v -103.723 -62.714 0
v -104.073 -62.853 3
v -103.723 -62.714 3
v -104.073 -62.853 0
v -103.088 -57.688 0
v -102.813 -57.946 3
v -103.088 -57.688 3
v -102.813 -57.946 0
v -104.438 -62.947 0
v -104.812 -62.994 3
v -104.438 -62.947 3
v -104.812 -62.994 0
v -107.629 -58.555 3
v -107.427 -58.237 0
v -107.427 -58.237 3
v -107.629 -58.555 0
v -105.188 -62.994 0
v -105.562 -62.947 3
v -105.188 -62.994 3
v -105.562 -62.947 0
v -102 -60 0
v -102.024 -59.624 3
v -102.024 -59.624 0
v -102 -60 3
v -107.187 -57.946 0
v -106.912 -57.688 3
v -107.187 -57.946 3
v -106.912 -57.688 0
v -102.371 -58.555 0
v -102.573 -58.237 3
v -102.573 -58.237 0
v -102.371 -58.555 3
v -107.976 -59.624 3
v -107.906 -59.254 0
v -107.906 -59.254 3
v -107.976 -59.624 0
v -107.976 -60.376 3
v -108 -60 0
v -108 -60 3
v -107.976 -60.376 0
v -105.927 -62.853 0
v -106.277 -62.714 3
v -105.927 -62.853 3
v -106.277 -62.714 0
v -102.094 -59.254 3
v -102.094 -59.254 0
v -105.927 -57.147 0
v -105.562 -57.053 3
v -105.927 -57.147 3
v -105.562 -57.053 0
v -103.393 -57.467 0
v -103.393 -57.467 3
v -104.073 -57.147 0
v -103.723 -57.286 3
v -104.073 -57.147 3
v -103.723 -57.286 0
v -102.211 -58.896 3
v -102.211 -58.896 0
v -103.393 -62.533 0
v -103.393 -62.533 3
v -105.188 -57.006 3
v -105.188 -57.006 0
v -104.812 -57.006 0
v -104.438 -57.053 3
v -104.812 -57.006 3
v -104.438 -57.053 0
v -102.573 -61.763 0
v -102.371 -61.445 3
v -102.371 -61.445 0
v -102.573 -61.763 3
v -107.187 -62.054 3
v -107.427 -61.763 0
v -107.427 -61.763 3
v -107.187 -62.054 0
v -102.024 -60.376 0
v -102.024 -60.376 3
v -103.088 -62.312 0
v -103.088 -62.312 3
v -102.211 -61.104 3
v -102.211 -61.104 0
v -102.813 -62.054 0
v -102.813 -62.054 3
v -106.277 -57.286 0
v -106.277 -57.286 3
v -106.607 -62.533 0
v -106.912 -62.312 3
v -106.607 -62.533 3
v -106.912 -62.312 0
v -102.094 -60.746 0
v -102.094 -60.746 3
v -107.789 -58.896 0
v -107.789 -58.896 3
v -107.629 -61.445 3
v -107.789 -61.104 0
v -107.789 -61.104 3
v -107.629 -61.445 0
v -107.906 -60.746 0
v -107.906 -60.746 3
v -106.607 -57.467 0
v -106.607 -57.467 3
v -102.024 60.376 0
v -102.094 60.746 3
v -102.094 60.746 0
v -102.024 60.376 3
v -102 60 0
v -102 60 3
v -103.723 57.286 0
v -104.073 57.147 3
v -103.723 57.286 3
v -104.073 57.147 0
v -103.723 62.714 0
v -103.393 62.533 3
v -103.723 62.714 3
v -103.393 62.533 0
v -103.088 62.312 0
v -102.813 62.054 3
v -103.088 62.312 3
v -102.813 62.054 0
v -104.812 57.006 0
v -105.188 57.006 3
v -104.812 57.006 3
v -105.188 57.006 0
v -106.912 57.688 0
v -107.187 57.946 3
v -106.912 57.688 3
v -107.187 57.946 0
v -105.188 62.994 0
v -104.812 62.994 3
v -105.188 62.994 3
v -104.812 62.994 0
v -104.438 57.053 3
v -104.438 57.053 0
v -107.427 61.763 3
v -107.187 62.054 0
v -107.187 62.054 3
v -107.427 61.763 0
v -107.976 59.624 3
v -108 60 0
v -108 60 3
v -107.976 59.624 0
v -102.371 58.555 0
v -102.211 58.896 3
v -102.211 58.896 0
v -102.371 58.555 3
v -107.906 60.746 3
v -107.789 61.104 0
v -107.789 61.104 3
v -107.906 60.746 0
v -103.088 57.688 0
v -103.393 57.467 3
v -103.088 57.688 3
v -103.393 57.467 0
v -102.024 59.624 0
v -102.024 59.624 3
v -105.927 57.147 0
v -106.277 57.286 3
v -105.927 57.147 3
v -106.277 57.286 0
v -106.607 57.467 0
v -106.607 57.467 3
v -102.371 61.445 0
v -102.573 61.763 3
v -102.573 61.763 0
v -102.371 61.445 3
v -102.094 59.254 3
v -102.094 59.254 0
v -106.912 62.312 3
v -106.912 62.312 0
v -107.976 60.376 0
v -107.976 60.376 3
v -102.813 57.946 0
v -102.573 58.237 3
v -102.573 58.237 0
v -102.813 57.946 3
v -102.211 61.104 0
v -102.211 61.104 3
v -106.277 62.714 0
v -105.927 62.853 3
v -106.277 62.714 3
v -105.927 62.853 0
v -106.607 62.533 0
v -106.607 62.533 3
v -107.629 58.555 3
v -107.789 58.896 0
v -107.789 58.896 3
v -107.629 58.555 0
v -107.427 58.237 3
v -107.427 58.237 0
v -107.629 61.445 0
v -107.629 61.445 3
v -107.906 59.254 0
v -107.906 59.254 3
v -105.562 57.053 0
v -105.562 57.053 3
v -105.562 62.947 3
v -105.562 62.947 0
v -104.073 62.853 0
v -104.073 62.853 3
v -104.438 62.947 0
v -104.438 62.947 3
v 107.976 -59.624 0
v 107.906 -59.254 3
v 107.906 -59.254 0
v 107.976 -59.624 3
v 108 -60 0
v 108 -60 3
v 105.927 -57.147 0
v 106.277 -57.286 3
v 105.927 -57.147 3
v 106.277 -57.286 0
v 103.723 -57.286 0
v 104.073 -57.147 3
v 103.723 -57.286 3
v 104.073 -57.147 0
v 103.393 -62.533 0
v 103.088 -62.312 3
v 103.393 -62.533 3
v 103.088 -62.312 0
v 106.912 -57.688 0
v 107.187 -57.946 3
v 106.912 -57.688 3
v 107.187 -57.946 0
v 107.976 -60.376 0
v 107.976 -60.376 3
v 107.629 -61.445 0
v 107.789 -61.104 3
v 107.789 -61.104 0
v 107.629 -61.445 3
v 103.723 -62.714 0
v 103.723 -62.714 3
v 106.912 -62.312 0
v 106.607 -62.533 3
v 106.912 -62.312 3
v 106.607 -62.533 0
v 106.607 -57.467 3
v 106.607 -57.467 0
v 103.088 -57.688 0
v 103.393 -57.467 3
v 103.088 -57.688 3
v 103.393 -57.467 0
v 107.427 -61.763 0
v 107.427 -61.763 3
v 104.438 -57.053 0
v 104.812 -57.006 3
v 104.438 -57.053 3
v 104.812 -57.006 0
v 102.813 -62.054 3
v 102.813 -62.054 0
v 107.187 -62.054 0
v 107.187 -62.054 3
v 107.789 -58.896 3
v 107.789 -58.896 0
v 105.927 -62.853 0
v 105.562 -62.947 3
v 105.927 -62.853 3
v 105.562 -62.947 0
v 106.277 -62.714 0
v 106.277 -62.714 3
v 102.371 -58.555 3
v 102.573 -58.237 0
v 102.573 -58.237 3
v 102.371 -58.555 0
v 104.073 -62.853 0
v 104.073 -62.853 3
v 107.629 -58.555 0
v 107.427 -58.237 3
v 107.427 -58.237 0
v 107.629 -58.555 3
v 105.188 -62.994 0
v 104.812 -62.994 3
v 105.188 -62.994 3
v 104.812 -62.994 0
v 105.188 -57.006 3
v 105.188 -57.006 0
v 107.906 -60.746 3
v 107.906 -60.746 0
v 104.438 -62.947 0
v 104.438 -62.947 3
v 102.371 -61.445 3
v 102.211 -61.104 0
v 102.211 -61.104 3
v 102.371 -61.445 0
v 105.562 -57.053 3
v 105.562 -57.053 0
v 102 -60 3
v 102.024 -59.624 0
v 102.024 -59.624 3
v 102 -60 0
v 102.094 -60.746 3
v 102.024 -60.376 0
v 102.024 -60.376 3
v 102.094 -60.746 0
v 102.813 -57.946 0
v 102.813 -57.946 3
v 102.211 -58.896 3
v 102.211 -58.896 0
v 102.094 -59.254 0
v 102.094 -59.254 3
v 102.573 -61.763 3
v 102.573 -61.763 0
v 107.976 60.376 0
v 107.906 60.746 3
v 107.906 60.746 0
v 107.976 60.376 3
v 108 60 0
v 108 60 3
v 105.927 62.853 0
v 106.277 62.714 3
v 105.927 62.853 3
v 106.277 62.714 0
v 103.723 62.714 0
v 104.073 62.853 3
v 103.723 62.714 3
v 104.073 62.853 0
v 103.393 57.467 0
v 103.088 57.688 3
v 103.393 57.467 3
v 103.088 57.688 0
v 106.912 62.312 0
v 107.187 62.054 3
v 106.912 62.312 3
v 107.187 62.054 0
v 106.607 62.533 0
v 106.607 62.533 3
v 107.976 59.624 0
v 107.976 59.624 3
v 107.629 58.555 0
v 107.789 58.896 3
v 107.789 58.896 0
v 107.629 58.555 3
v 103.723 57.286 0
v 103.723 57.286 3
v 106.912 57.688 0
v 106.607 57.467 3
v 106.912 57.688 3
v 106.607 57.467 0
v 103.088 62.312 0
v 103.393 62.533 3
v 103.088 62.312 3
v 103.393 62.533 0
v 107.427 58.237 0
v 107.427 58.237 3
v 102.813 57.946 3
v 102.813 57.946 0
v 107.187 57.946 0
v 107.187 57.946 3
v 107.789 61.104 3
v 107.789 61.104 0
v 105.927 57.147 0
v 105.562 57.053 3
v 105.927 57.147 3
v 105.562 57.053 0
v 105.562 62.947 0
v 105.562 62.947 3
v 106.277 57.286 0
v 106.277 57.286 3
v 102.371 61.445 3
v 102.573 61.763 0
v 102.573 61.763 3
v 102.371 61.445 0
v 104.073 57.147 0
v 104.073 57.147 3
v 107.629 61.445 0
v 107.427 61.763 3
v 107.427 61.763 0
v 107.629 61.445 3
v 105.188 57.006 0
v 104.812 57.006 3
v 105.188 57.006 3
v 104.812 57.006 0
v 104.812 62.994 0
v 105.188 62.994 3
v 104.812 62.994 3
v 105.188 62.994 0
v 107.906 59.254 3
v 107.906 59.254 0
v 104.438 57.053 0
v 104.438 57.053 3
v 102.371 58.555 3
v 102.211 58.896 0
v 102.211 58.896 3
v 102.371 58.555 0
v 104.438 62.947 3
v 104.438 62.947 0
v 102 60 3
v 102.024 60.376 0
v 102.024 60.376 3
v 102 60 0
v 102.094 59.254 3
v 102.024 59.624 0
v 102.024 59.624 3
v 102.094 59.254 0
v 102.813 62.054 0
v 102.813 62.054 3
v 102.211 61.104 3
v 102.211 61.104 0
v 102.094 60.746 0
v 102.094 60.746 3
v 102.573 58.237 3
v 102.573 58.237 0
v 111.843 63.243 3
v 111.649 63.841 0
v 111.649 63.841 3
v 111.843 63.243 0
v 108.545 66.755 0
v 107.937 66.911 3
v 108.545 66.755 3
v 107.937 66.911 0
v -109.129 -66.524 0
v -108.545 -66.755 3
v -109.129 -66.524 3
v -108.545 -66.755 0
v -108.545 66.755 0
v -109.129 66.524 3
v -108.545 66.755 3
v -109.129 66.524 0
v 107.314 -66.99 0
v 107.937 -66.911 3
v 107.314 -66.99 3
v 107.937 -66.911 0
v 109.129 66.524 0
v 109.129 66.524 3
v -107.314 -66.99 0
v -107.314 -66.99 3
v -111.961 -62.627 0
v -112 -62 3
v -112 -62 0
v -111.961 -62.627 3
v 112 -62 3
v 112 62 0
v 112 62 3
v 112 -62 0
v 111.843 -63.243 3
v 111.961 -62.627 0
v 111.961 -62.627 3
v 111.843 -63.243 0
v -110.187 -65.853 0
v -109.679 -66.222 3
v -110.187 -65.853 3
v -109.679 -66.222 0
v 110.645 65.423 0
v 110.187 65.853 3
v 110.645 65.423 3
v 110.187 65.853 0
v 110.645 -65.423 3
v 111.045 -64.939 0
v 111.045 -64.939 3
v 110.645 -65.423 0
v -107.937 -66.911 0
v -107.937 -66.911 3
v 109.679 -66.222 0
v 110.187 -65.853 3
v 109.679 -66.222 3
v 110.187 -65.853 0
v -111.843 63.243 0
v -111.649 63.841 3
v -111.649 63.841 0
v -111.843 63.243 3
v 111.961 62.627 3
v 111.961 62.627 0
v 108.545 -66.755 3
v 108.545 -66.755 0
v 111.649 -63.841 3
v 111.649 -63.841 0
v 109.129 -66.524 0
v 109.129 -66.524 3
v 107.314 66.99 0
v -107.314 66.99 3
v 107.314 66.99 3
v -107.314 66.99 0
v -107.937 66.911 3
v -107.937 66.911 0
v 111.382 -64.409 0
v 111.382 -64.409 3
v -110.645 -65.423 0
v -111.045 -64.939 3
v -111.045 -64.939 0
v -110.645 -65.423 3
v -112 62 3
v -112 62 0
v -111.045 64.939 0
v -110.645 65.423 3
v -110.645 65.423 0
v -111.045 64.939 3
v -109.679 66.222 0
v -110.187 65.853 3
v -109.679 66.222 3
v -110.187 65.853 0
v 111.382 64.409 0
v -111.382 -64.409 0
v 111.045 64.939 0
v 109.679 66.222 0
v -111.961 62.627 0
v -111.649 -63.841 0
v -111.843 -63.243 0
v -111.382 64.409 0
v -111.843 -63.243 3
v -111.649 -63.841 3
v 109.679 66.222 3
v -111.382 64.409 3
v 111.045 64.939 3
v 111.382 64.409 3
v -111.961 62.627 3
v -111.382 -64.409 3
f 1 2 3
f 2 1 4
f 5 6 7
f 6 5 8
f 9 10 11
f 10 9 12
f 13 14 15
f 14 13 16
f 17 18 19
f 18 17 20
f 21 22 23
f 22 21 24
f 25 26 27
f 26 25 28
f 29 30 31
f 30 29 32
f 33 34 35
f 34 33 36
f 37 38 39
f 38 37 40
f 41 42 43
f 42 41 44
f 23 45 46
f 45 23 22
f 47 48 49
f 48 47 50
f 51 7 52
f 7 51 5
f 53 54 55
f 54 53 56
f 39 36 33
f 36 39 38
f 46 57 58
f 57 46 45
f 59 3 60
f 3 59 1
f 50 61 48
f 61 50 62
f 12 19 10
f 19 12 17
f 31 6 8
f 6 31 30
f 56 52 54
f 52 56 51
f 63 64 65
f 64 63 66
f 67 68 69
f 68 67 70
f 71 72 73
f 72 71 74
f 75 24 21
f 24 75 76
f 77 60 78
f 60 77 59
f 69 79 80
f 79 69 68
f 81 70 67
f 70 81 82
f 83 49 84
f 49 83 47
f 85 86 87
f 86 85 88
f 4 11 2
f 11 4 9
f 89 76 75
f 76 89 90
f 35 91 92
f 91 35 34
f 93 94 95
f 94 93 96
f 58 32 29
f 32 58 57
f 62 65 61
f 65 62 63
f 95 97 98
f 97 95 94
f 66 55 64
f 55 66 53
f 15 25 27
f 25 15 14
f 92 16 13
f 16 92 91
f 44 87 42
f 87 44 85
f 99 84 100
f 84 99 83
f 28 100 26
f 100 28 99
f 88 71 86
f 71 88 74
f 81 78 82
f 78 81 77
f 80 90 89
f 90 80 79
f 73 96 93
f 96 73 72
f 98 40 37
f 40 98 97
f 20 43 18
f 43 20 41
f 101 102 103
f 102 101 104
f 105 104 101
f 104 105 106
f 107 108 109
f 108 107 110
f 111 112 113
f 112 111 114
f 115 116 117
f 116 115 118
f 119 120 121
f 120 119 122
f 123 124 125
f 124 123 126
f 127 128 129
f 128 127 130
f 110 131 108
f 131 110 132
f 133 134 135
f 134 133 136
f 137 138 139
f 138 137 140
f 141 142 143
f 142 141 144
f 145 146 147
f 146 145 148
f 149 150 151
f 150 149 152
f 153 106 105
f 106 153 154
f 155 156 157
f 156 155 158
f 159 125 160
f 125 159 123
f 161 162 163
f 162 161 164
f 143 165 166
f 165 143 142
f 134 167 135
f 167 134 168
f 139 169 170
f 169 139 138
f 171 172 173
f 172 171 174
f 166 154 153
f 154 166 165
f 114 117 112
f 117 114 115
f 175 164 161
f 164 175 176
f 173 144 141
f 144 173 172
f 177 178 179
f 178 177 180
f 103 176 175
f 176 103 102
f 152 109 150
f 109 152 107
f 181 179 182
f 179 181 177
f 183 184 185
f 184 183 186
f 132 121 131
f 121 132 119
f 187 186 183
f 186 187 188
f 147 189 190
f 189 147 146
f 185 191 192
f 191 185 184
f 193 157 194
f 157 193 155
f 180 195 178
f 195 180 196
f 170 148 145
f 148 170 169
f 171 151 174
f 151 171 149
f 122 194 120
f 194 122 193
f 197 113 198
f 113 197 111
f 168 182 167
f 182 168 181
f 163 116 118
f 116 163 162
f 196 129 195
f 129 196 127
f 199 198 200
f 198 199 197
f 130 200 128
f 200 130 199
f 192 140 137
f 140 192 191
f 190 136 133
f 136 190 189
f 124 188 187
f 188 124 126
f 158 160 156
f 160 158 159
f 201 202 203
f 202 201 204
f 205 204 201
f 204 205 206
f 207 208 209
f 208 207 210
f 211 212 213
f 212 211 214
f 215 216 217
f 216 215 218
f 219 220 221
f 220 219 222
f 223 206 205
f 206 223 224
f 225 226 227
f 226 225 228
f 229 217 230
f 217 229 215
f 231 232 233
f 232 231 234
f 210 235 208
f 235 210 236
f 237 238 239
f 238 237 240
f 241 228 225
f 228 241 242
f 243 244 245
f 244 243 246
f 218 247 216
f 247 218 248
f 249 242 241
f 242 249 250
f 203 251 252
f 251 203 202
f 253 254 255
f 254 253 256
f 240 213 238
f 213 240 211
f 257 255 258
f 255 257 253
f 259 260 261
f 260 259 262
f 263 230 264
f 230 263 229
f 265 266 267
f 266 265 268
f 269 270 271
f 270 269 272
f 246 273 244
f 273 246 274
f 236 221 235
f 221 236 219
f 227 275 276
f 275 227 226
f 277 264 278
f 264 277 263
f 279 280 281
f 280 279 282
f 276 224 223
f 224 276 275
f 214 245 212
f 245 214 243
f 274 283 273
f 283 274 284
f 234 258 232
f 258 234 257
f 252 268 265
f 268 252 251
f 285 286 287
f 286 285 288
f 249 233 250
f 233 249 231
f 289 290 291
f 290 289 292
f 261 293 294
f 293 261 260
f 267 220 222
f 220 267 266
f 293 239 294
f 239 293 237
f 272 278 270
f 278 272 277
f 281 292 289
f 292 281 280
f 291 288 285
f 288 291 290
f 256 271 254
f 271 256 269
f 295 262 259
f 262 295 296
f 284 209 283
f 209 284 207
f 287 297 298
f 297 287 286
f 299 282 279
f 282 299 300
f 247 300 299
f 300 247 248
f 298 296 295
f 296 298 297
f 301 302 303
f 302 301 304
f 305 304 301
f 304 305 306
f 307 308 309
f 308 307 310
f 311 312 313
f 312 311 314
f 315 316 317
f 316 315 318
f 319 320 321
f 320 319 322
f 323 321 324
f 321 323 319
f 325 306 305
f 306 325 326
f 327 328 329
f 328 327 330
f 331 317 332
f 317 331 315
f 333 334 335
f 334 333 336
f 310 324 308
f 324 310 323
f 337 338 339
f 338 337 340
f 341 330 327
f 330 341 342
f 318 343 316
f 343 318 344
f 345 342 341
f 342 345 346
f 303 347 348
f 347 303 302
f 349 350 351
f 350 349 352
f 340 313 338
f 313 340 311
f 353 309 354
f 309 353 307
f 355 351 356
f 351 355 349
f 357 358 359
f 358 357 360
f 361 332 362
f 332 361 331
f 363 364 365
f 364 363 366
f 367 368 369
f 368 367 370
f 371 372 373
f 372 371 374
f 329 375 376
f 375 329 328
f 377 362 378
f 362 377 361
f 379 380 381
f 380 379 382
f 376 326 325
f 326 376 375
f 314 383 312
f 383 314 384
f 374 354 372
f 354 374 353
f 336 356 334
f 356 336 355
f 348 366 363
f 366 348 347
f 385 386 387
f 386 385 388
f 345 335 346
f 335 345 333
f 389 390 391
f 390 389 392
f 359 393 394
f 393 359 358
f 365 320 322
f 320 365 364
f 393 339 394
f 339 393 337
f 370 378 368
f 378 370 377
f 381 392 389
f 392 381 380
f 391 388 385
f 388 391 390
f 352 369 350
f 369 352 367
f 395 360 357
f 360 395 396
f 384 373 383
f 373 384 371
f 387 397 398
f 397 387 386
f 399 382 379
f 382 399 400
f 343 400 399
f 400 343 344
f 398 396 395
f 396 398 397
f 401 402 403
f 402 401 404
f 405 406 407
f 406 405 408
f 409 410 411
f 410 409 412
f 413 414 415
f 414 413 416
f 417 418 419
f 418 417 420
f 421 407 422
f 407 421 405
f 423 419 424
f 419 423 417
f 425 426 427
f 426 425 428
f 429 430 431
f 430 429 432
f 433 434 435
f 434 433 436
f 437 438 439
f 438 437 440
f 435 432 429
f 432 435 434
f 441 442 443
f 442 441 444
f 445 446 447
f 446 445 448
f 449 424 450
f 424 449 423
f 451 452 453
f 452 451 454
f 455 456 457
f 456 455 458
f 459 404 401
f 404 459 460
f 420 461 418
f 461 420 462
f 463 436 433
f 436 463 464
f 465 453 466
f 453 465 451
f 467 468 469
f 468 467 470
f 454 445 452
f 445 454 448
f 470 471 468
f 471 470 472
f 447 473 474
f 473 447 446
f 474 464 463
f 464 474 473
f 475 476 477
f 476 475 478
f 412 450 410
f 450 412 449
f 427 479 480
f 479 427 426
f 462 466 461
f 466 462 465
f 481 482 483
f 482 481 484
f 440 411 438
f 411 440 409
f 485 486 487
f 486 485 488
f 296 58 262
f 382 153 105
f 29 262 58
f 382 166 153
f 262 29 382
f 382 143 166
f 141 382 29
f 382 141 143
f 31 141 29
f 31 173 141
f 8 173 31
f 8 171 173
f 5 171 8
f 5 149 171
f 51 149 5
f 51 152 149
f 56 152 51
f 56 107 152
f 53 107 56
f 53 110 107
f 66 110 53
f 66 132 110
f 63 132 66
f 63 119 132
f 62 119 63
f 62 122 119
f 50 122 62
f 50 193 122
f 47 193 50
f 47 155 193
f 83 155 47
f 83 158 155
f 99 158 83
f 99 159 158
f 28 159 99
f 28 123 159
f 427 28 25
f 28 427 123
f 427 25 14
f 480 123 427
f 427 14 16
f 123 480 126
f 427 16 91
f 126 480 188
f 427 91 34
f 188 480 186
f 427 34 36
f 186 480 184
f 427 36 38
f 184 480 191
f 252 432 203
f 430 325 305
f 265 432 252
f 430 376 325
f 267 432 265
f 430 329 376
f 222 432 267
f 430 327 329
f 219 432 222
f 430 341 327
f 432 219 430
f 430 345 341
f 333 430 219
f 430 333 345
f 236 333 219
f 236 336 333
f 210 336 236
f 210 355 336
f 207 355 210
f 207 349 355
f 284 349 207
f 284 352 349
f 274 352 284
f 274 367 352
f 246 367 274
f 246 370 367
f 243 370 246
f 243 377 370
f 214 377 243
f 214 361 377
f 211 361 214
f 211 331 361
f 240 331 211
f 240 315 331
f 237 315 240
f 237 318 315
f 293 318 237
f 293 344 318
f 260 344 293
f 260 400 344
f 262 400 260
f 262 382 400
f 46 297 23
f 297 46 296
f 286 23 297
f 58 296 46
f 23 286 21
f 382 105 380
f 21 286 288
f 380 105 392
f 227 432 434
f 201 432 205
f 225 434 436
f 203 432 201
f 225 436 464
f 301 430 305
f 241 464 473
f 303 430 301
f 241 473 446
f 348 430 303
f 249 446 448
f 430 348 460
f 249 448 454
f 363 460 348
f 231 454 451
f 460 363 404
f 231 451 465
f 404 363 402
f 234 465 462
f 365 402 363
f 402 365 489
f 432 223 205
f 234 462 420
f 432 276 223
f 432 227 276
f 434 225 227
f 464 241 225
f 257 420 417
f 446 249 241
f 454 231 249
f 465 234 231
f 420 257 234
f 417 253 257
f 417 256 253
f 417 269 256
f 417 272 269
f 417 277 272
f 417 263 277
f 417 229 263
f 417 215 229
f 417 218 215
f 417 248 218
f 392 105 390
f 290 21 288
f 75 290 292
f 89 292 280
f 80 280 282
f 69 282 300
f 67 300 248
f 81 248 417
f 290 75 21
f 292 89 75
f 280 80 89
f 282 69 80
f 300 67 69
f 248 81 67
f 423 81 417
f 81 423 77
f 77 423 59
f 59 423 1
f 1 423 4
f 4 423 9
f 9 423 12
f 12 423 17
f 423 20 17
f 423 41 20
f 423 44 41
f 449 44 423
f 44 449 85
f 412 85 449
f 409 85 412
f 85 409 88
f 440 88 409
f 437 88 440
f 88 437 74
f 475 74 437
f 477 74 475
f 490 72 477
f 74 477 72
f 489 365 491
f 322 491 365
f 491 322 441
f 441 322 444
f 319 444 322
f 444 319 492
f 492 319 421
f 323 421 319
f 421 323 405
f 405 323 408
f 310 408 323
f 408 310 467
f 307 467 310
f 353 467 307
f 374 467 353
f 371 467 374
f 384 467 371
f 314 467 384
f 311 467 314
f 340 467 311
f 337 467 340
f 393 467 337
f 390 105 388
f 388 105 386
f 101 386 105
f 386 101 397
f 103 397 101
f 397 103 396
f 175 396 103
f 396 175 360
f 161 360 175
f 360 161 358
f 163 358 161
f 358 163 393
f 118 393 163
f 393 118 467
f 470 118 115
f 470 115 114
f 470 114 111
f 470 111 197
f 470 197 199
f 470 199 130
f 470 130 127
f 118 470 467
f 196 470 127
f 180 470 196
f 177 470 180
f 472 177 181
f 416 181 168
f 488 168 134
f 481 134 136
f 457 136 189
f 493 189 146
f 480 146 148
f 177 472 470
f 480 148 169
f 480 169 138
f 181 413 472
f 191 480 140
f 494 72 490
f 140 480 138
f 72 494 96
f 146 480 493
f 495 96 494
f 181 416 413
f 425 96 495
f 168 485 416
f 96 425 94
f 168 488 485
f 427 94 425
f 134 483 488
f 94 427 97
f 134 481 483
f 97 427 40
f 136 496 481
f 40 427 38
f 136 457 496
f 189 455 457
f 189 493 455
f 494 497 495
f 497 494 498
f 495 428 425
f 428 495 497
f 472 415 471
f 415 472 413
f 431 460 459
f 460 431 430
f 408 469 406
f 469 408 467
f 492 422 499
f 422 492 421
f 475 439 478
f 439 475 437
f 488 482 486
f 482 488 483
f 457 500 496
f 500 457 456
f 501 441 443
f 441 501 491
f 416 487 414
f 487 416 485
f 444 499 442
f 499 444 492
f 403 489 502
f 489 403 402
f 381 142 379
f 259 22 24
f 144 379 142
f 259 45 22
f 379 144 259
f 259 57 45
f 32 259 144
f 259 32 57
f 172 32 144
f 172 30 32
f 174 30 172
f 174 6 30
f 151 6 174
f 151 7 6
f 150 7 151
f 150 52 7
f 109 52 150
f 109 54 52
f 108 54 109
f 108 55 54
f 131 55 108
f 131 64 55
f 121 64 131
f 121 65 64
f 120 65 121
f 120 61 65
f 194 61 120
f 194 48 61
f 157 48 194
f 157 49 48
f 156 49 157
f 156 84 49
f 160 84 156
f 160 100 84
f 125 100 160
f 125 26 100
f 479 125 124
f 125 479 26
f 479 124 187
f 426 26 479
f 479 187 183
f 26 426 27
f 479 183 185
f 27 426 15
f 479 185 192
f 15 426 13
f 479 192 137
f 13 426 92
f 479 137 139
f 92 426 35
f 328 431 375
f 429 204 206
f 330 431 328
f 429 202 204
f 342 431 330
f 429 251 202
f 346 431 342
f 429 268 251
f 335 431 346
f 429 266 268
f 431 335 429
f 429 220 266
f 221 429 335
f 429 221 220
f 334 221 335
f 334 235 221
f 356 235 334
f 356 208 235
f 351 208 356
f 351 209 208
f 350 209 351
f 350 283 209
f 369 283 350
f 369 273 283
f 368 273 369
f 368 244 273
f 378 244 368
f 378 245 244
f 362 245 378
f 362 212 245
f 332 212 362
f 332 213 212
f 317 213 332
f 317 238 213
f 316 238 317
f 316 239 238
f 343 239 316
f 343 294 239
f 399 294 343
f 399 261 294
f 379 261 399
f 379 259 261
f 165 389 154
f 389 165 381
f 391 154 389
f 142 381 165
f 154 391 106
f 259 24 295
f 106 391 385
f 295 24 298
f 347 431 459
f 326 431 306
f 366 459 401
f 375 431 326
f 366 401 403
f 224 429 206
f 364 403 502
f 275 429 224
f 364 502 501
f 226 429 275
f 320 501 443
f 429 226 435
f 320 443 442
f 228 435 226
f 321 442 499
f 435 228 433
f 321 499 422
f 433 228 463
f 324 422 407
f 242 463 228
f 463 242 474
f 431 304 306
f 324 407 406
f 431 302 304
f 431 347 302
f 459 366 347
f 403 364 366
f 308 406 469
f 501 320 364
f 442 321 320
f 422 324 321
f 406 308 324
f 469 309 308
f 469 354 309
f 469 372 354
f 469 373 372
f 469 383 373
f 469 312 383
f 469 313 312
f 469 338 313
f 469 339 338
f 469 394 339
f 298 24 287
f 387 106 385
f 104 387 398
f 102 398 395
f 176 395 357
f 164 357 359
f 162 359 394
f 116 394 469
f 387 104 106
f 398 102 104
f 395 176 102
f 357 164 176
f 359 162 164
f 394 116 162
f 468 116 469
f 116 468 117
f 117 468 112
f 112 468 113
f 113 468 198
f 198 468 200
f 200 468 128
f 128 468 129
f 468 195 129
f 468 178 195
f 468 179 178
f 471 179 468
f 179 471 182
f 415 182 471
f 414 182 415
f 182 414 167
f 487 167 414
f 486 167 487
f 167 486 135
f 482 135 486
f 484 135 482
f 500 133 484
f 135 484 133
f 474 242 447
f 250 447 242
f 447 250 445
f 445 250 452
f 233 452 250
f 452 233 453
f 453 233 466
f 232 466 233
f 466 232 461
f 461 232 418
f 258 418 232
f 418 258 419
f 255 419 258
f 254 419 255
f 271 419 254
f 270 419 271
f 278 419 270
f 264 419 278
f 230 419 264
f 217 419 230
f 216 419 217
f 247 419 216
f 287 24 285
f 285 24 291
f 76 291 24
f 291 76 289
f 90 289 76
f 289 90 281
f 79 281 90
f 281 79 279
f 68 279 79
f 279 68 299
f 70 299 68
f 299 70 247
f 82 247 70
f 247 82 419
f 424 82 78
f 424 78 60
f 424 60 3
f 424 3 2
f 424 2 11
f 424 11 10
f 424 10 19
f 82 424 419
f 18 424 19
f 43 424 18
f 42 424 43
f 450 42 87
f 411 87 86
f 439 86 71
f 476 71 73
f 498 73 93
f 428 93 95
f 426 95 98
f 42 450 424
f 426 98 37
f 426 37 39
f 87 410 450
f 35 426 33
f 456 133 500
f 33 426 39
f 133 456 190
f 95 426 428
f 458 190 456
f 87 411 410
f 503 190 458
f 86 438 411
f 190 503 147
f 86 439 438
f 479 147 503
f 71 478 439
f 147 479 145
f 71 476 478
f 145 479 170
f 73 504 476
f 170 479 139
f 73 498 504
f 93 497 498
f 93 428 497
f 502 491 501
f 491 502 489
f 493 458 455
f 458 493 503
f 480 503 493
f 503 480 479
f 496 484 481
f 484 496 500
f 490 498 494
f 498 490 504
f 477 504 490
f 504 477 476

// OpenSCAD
$fn = 50;


difference() {
	union() {
		hull() {
			translate(v = [-107.0000000000, 62.0000000000, 0]) {
				cylinder(h = 3, r = 5);
			}
			translate(v = [107.0000000000, 62.0000000000, 0]) {
				cylinder(h = 3, r = 5);
			}
			translate(v = [-107.0000000000, -62.0000000000, 0]) {
				cylinder(h = 3, r = 5);
			}
			translate(v = [107.0000000000, -62.0000000000, 0]) {
				cylinder(h = 3, r = 5);
			}
		}
	}
	union() {
		translate(v = [-105.0000000000, -60.0000000000, -100.0000000000]) {
			cylinder(h = 200, r = 3.0000000000);
		}
		translate(v = [-105.0000000000, 60.0000000000, -100.0000000000]) {
			cylinder(h = 200, r = 3.0000000000);
		}
		translate(v = [105.0000000000, -60.0000000000, -100.0000000000]) {
			cylinder(h = 200, r = 3.0000000000);
		}
		translate(v = [105.0000000000, 60.0000000000, -100.0000000000]) {
			cylinder(h = 200, r = 3.0000000000);
		}
	}
}
